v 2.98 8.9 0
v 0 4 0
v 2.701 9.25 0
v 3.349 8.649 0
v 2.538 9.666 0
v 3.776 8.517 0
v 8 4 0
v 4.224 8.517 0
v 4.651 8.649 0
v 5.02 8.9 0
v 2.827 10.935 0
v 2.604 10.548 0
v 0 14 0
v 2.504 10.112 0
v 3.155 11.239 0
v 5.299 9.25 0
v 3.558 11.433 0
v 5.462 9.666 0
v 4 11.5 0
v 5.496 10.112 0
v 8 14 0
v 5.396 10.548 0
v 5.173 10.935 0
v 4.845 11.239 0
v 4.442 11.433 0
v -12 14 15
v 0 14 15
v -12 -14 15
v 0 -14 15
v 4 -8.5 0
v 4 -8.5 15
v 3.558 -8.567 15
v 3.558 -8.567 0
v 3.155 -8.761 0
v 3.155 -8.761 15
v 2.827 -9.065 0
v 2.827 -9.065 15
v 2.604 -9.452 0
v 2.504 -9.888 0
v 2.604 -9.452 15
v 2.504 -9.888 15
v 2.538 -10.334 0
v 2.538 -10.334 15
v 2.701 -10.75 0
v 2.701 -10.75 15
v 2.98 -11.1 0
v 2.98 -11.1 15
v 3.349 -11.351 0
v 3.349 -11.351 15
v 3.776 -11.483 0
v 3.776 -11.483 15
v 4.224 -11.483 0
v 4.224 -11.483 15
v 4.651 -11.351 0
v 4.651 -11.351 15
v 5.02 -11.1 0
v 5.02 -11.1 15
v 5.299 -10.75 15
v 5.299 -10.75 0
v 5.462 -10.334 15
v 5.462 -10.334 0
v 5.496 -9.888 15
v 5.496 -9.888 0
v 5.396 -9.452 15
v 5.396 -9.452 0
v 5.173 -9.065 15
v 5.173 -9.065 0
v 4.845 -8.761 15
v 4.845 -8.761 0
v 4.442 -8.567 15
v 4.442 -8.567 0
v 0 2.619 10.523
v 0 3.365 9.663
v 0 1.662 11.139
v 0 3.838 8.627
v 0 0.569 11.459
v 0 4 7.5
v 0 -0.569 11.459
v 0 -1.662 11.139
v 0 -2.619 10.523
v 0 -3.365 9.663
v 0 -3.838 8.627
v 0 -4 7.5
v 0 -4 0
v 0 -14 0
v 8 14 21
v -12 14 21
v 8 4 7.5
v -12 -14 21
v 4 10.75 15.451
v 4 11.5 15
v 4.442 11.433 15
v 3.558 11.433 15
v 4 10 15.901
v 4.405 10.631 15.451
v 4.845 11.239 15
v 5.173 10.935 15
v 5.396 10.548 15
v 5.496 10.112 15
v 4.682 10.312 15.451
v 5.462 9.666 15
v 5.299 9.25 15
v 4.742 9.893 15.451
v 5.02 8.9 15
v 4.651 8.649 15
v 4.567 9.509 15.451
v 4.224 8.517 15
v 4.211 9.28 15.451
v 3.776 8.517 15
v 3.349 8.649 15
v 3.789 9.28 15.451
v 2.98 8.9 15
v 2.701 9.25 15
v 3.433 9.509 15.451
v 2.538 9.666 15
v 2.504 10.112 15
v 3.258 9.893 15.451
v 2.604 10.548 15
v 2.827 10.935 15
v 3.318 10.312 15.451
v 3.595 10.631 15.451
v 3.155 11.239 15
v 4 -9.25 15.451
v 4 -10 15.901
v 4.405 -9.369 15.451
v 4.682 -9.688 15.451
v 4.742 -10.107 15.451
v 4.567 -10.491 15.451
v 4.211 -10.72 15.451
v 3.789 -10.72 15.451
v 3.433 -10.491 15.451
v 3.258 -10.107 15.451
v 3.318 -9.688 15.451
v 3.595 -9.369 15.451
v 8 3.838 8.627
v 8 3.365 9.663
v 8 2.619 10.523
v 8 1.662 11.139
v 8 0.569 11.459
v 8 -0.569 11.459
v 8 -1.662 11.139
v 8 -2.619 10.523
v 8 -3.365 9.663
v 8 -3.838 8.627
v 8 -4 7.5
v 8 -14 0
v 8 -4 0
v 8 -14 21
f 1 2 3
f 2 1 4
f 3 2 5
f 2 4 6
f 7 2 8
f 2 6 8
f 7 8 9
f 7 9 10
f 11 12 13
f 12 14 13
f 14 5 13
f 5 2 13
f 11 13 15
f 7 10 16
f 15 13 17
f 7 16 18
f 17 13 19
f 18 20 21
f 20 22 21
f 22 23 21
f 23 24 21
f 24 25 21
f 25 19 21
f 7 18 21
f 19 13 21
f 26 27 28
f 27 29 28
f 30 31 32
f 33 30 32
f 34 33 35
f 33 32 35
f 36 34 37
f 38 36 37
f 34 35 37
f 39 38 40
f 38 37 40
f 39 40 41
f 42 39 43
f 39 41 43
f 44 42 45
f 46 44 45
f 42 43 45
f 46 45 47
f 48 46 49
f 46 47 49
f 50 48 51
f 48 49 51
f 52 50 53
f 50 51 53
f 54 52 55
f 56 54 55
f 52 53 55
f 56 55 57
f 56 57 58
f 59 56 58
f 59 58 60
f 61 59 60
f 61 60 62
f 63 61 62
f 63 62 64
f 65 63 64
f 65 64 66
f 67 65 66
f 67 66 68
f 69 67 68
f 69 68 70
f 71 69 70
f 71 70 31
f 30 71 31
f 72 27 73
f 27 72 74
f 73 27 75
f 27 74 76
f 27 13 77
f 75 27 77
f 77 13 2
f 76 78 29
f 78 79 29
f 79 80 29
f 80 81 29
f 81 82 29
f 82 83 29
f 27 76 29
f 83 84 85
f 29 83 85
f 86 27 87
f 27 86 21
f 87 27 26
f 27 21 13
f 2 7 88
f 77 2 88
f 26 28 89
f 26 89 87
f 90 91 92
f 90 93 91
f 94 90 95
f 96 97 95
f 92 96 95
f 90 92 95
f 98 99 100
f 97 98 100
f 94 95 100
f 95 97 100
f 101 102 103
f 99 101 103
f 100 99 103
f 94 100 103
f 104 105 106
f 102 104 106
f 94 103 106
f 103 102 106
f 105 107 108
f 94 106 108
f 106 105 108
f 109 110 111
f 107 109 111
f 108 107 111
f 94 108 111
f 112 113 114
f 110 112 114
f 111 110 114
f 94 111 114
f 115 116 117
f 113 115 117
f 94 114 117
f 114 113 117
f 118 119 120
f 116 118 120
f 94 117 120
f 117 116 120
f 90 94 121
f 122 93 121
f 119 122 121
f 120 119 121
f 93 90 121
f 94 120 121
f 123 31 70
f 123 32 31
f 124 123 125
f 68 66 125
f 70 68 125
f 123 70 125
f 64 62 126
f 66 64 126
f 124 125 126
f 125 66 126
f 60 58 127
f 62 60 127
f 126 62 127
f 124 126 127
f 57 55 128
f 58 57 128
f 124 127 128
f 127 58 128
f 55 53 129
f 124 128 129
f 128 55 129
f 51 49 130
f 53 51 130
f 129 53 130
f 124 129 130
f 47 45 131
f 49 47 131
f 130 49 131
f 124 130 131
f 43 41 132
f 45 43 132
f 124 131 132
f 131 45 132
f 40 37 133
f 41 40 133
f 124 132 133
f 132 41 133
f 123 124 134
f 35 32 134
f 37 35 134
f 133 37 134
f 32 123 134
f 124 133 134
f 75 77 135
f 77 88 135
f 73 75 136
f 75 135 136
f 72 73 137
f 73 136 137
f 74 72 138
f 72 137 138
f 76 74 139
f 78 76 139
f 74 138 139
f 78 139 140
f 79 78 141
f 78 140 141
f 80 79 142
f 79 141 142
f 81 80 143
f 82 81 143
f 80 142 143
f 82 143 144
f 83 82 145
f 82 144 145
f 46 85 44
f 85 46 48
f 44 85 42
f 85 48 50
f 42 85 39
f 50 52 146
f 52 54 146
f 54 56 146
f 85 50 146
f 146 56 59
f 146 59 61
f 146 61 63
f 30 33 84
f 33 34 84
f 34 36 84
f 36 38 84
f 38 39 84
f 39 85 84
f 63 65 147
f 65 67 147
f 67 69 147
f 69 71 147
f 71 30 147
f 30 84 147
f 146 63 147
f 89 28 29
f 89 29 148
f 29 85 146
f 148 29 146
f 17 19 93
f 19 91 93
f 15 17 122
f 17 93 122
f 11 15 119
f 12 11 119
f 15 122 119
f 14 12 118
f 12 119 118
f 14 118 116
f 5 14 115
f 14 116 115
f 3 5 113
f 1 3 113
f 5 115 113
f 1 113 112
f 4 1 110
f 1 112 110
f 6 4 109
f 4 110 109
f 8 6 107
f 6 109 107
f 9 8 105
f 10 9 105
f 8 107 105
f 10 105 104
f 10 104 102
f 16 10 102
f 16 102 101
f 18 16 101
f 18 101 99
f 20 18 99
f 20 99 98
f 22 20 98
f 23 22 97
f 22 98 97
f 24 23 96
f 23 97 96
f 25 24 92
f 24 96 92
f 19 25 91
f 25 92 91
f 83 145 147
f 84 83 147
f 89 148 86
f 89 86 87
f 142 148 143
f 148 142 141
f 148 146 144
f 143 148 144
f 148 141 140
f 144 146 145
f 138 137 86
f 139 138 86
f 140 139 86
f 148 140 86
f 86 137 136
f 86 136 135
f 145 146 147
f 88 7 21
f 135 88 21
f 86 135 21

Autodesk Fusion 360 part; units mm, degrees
sketch "スケッチ1" plane through (0, 0, 0) normal (0, 0, 1) x (1, 0, 0)
  line L0 (0, -14) -> (8, -14)
  line L1 (8, -14) -> (8, 14)
  line L2 (8, 14) -> (0, 14)
  line L3 (0, 14) -> (0, -14)
  dimension "d1" = 8
  dimension "d2" = 28
extrude "押し出し1" add sketch "スケッチ1" along normal blind 15
sketch "スケッチ2" plane through (0, 0, 15) normal (0, 0, 1) x (-1, 0, 0)
  line L0 (0, -14) -> (0, 14)
  line L1 (0, 14) -> (-8, 14)
  line L2 (-8, 14) -> (-8, -14)
  line L3 (-8, -14) -> (0, -14)
  line L4 (12, -14) -> (-8, -14)
  line L5 (-8, -14) -> (-8, 14)
  line L6 (-8, 14) -> (12, 14)
  line L7 (12, 14) -> (12, -14)
  dimension "d5" = 20
extrude "押し出し2" add sketch "スケッチ2" along normal blind 6
sketch "スケッチ3" plane through (8, 0, 0) normal (1, 0, 0) x (0, 1, 0)
  line L0 (-14, 0) -> (14, 0)
  line L1 (14, 0) -> (14, 21)
  line L2 (14, 21) -> (-14, 21)
  line L3 (-14, 21) -> (-14, 0)
  line L4 (-4, 0) -> (4, 0)
  line L5 (4, 0) -> (4, 7.5)
  line L6 (4, 7.5) -> (-4, 7.5)
  line L7 (-4, 7.5) -> (-4, 0)
  circle A0 centre (0, 7.5) radius 4
  dimension "d8" = 8
  dimension "d9" = 7.5
extrude "押し出し3" cut sketch "スケッチ3" against normal through all contours L0 L4 L5 L7 A0 | L6 A0 | L6 A0
sketch "スケッチ4" plane through (0, 0, 0) normal (0, 0, -1) x (1, 0, 0)
  line L0 (0, 4) -> (8, 4)
  line L1 (8, 4) -> (8, 14)
  line L2 (8, 14) -> (0, 14)
  line L3 (0, 14) -> (0, 4)
  line L4 (4, 10) -> (4, -10)
  line L5 (8, -14) -> (0, -14)
  point P0 (4, 14)
  dimension "d11" = 4
  dimension "d12" = 4
hole "穴1" at (4, -10, 0) at (4, 10, 0) direction (0, 0, 1) diameter 3 depth 15 tip angle 118
thread "ねじ1"
